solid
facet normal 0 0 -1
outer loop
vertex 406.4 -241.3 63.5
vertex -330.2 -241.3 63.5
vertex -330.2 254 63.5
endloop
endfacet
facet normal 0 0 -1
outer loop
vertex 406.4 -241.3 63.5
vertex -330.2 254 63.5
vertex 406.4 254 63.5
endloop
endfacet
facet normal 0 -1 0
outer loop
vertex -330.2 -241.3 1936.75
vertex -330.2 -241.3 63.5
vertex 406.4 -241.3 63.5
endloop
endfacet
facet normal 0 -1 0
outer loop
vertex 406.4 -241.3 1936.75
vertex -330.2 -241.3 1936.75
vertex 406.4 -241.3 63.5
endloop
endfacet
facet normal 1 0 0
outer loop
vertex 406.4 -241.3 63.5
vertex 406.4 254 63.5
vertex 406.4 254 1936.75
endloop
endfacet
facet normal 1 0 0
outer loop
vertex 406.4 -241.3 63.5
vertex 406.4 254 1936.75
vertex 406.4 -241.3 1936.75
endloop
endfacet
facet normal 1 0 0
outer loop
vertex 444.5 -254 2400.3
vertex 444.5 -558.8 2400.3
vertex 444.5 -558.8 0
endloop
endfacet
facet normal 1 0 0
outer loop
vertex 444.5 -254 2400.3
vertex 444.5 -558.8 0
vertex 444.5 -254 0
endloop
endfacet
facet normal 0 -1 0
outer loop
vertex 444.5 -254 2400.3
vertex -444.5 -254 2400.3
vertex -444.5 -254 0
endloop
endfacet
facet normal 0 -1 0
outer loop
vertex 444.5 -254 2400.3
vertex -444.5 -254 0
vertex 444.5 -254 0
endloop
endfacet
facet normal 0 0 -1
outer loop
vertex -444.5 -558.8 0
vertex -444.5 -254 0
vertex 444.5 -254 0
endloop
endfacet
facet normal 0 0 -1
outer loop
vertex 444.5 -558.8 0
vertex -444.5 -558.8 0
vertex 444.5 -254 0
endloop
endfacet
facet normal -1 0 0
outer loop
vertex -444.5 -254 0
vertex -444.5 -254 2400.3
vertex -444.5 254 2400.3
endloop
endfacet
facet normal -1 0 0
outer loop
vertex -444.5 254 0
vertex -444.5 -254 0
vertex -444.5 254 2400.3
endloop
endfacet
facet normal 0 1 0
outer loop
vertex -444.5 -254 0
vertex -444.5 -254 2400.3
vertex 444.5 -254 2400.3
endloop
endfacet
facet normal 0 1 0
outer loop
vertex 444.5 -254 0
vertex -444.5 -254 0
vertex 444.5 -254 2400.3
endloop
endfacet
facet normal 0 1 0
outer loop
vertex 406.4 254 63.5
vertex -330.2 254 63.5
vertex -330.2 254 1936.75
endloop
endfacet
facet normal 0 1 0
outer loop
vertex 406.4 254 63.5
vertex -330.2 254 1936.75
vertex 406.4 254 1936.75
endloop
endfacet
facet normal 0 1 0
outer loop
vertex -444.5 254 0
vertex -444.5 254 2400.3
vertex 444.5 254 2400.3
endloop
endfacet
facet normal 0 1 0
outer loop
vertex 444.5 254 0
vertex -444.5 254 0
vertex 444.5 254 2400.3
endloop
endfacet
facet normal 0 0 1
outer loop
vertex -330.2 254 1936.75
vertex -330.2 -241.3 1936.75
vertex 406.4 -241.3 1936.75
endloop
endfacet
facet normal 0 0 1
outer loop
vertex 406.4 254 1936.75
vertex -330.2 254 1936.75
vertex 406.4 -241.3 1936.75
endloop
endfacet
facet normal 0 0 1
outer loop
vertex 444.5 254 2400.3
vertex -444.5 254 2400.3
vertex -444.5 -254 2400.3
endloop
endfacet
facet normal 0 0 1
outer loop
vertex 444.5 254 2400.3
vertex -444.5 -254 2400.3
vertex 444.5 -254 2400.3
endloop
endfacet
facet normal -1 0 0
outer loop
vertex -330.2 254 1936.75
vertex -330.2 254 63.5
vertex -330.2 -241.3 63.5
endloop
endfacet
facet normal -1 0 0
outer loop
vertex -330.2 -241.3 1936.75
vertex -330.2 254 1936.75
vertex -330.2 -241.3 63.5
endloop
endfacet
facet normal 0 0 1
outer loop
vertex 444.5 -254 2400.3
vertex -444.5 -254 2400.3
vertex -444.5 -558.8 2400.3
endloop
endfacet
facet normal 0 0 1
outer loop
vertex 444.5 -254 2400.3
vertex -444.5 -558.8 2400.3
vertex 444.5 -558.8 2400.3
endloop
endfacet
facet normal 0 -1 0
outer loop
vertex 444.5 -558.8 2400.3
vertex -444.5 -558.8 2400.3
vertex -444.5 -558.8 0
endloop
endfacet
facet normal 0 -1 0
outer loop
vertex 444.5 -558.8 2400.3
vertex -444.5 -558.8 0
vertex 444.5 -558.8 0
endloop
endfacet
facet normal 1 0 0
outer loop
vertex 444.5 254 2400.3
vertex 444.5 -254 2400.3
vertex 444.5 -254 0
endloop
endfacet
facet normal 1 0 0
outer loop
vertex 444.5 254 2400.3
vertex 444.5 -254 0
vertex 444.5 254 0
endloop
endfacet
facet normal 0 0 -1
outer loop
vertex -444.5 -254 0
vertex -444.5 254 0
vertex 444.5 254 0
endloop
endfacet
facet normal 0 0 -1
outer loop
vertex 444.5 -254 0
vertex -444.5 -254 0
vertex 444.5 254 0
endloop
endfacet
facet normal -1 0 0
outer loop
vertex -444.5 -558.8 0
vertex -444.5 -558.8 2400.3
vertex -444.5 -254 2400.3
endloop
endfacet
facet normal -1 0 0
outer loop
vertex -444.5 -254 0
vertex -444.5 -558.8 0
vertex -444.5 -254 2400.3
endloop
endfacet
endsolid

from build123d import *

# Parameters (mm, degrees)
F0_W     = 889
F0_H     = 508
F1_DEPTH = 2400.3
F2_W     = 889
F2_H     = 304.8
F3_DEPTH = 2400.3
F5_W     = 736.6
F5_H     = 495.3
F6_DEPTH = 1873.25


with BuildPart() as f1:
    # F0 (on Top) → F1 (new body)
    with BuildSketch(Plane.XY):
        Rectangle(F0_W, F0_H)
    extrude(amount=F1_DEPTH)


with BuildPart() as f3:
    # F2 (on Top) → F3 (new body)
    with BuildSketch(Plane.XY):
        with Locations((0, -406.4)):
            Rectangle(F2_W, F2_H)
    extrude(amount=F3_DEPTH)


with BuildPart() as f6:
    # F5 (on offset) → F6 (new body)
    with BuildSketch(Plane(origin=(0, 0, 63.5), x_dir=(1, 0, 0), z_dir=(0, 0, -1))):
        with Locations((38.1, -6.35)):
            Rectangle(F5_W, F5_H)
    extrude(amount=-F6_DEPTH)


solid = Compound([f1.part, f3.part, f6.part])
